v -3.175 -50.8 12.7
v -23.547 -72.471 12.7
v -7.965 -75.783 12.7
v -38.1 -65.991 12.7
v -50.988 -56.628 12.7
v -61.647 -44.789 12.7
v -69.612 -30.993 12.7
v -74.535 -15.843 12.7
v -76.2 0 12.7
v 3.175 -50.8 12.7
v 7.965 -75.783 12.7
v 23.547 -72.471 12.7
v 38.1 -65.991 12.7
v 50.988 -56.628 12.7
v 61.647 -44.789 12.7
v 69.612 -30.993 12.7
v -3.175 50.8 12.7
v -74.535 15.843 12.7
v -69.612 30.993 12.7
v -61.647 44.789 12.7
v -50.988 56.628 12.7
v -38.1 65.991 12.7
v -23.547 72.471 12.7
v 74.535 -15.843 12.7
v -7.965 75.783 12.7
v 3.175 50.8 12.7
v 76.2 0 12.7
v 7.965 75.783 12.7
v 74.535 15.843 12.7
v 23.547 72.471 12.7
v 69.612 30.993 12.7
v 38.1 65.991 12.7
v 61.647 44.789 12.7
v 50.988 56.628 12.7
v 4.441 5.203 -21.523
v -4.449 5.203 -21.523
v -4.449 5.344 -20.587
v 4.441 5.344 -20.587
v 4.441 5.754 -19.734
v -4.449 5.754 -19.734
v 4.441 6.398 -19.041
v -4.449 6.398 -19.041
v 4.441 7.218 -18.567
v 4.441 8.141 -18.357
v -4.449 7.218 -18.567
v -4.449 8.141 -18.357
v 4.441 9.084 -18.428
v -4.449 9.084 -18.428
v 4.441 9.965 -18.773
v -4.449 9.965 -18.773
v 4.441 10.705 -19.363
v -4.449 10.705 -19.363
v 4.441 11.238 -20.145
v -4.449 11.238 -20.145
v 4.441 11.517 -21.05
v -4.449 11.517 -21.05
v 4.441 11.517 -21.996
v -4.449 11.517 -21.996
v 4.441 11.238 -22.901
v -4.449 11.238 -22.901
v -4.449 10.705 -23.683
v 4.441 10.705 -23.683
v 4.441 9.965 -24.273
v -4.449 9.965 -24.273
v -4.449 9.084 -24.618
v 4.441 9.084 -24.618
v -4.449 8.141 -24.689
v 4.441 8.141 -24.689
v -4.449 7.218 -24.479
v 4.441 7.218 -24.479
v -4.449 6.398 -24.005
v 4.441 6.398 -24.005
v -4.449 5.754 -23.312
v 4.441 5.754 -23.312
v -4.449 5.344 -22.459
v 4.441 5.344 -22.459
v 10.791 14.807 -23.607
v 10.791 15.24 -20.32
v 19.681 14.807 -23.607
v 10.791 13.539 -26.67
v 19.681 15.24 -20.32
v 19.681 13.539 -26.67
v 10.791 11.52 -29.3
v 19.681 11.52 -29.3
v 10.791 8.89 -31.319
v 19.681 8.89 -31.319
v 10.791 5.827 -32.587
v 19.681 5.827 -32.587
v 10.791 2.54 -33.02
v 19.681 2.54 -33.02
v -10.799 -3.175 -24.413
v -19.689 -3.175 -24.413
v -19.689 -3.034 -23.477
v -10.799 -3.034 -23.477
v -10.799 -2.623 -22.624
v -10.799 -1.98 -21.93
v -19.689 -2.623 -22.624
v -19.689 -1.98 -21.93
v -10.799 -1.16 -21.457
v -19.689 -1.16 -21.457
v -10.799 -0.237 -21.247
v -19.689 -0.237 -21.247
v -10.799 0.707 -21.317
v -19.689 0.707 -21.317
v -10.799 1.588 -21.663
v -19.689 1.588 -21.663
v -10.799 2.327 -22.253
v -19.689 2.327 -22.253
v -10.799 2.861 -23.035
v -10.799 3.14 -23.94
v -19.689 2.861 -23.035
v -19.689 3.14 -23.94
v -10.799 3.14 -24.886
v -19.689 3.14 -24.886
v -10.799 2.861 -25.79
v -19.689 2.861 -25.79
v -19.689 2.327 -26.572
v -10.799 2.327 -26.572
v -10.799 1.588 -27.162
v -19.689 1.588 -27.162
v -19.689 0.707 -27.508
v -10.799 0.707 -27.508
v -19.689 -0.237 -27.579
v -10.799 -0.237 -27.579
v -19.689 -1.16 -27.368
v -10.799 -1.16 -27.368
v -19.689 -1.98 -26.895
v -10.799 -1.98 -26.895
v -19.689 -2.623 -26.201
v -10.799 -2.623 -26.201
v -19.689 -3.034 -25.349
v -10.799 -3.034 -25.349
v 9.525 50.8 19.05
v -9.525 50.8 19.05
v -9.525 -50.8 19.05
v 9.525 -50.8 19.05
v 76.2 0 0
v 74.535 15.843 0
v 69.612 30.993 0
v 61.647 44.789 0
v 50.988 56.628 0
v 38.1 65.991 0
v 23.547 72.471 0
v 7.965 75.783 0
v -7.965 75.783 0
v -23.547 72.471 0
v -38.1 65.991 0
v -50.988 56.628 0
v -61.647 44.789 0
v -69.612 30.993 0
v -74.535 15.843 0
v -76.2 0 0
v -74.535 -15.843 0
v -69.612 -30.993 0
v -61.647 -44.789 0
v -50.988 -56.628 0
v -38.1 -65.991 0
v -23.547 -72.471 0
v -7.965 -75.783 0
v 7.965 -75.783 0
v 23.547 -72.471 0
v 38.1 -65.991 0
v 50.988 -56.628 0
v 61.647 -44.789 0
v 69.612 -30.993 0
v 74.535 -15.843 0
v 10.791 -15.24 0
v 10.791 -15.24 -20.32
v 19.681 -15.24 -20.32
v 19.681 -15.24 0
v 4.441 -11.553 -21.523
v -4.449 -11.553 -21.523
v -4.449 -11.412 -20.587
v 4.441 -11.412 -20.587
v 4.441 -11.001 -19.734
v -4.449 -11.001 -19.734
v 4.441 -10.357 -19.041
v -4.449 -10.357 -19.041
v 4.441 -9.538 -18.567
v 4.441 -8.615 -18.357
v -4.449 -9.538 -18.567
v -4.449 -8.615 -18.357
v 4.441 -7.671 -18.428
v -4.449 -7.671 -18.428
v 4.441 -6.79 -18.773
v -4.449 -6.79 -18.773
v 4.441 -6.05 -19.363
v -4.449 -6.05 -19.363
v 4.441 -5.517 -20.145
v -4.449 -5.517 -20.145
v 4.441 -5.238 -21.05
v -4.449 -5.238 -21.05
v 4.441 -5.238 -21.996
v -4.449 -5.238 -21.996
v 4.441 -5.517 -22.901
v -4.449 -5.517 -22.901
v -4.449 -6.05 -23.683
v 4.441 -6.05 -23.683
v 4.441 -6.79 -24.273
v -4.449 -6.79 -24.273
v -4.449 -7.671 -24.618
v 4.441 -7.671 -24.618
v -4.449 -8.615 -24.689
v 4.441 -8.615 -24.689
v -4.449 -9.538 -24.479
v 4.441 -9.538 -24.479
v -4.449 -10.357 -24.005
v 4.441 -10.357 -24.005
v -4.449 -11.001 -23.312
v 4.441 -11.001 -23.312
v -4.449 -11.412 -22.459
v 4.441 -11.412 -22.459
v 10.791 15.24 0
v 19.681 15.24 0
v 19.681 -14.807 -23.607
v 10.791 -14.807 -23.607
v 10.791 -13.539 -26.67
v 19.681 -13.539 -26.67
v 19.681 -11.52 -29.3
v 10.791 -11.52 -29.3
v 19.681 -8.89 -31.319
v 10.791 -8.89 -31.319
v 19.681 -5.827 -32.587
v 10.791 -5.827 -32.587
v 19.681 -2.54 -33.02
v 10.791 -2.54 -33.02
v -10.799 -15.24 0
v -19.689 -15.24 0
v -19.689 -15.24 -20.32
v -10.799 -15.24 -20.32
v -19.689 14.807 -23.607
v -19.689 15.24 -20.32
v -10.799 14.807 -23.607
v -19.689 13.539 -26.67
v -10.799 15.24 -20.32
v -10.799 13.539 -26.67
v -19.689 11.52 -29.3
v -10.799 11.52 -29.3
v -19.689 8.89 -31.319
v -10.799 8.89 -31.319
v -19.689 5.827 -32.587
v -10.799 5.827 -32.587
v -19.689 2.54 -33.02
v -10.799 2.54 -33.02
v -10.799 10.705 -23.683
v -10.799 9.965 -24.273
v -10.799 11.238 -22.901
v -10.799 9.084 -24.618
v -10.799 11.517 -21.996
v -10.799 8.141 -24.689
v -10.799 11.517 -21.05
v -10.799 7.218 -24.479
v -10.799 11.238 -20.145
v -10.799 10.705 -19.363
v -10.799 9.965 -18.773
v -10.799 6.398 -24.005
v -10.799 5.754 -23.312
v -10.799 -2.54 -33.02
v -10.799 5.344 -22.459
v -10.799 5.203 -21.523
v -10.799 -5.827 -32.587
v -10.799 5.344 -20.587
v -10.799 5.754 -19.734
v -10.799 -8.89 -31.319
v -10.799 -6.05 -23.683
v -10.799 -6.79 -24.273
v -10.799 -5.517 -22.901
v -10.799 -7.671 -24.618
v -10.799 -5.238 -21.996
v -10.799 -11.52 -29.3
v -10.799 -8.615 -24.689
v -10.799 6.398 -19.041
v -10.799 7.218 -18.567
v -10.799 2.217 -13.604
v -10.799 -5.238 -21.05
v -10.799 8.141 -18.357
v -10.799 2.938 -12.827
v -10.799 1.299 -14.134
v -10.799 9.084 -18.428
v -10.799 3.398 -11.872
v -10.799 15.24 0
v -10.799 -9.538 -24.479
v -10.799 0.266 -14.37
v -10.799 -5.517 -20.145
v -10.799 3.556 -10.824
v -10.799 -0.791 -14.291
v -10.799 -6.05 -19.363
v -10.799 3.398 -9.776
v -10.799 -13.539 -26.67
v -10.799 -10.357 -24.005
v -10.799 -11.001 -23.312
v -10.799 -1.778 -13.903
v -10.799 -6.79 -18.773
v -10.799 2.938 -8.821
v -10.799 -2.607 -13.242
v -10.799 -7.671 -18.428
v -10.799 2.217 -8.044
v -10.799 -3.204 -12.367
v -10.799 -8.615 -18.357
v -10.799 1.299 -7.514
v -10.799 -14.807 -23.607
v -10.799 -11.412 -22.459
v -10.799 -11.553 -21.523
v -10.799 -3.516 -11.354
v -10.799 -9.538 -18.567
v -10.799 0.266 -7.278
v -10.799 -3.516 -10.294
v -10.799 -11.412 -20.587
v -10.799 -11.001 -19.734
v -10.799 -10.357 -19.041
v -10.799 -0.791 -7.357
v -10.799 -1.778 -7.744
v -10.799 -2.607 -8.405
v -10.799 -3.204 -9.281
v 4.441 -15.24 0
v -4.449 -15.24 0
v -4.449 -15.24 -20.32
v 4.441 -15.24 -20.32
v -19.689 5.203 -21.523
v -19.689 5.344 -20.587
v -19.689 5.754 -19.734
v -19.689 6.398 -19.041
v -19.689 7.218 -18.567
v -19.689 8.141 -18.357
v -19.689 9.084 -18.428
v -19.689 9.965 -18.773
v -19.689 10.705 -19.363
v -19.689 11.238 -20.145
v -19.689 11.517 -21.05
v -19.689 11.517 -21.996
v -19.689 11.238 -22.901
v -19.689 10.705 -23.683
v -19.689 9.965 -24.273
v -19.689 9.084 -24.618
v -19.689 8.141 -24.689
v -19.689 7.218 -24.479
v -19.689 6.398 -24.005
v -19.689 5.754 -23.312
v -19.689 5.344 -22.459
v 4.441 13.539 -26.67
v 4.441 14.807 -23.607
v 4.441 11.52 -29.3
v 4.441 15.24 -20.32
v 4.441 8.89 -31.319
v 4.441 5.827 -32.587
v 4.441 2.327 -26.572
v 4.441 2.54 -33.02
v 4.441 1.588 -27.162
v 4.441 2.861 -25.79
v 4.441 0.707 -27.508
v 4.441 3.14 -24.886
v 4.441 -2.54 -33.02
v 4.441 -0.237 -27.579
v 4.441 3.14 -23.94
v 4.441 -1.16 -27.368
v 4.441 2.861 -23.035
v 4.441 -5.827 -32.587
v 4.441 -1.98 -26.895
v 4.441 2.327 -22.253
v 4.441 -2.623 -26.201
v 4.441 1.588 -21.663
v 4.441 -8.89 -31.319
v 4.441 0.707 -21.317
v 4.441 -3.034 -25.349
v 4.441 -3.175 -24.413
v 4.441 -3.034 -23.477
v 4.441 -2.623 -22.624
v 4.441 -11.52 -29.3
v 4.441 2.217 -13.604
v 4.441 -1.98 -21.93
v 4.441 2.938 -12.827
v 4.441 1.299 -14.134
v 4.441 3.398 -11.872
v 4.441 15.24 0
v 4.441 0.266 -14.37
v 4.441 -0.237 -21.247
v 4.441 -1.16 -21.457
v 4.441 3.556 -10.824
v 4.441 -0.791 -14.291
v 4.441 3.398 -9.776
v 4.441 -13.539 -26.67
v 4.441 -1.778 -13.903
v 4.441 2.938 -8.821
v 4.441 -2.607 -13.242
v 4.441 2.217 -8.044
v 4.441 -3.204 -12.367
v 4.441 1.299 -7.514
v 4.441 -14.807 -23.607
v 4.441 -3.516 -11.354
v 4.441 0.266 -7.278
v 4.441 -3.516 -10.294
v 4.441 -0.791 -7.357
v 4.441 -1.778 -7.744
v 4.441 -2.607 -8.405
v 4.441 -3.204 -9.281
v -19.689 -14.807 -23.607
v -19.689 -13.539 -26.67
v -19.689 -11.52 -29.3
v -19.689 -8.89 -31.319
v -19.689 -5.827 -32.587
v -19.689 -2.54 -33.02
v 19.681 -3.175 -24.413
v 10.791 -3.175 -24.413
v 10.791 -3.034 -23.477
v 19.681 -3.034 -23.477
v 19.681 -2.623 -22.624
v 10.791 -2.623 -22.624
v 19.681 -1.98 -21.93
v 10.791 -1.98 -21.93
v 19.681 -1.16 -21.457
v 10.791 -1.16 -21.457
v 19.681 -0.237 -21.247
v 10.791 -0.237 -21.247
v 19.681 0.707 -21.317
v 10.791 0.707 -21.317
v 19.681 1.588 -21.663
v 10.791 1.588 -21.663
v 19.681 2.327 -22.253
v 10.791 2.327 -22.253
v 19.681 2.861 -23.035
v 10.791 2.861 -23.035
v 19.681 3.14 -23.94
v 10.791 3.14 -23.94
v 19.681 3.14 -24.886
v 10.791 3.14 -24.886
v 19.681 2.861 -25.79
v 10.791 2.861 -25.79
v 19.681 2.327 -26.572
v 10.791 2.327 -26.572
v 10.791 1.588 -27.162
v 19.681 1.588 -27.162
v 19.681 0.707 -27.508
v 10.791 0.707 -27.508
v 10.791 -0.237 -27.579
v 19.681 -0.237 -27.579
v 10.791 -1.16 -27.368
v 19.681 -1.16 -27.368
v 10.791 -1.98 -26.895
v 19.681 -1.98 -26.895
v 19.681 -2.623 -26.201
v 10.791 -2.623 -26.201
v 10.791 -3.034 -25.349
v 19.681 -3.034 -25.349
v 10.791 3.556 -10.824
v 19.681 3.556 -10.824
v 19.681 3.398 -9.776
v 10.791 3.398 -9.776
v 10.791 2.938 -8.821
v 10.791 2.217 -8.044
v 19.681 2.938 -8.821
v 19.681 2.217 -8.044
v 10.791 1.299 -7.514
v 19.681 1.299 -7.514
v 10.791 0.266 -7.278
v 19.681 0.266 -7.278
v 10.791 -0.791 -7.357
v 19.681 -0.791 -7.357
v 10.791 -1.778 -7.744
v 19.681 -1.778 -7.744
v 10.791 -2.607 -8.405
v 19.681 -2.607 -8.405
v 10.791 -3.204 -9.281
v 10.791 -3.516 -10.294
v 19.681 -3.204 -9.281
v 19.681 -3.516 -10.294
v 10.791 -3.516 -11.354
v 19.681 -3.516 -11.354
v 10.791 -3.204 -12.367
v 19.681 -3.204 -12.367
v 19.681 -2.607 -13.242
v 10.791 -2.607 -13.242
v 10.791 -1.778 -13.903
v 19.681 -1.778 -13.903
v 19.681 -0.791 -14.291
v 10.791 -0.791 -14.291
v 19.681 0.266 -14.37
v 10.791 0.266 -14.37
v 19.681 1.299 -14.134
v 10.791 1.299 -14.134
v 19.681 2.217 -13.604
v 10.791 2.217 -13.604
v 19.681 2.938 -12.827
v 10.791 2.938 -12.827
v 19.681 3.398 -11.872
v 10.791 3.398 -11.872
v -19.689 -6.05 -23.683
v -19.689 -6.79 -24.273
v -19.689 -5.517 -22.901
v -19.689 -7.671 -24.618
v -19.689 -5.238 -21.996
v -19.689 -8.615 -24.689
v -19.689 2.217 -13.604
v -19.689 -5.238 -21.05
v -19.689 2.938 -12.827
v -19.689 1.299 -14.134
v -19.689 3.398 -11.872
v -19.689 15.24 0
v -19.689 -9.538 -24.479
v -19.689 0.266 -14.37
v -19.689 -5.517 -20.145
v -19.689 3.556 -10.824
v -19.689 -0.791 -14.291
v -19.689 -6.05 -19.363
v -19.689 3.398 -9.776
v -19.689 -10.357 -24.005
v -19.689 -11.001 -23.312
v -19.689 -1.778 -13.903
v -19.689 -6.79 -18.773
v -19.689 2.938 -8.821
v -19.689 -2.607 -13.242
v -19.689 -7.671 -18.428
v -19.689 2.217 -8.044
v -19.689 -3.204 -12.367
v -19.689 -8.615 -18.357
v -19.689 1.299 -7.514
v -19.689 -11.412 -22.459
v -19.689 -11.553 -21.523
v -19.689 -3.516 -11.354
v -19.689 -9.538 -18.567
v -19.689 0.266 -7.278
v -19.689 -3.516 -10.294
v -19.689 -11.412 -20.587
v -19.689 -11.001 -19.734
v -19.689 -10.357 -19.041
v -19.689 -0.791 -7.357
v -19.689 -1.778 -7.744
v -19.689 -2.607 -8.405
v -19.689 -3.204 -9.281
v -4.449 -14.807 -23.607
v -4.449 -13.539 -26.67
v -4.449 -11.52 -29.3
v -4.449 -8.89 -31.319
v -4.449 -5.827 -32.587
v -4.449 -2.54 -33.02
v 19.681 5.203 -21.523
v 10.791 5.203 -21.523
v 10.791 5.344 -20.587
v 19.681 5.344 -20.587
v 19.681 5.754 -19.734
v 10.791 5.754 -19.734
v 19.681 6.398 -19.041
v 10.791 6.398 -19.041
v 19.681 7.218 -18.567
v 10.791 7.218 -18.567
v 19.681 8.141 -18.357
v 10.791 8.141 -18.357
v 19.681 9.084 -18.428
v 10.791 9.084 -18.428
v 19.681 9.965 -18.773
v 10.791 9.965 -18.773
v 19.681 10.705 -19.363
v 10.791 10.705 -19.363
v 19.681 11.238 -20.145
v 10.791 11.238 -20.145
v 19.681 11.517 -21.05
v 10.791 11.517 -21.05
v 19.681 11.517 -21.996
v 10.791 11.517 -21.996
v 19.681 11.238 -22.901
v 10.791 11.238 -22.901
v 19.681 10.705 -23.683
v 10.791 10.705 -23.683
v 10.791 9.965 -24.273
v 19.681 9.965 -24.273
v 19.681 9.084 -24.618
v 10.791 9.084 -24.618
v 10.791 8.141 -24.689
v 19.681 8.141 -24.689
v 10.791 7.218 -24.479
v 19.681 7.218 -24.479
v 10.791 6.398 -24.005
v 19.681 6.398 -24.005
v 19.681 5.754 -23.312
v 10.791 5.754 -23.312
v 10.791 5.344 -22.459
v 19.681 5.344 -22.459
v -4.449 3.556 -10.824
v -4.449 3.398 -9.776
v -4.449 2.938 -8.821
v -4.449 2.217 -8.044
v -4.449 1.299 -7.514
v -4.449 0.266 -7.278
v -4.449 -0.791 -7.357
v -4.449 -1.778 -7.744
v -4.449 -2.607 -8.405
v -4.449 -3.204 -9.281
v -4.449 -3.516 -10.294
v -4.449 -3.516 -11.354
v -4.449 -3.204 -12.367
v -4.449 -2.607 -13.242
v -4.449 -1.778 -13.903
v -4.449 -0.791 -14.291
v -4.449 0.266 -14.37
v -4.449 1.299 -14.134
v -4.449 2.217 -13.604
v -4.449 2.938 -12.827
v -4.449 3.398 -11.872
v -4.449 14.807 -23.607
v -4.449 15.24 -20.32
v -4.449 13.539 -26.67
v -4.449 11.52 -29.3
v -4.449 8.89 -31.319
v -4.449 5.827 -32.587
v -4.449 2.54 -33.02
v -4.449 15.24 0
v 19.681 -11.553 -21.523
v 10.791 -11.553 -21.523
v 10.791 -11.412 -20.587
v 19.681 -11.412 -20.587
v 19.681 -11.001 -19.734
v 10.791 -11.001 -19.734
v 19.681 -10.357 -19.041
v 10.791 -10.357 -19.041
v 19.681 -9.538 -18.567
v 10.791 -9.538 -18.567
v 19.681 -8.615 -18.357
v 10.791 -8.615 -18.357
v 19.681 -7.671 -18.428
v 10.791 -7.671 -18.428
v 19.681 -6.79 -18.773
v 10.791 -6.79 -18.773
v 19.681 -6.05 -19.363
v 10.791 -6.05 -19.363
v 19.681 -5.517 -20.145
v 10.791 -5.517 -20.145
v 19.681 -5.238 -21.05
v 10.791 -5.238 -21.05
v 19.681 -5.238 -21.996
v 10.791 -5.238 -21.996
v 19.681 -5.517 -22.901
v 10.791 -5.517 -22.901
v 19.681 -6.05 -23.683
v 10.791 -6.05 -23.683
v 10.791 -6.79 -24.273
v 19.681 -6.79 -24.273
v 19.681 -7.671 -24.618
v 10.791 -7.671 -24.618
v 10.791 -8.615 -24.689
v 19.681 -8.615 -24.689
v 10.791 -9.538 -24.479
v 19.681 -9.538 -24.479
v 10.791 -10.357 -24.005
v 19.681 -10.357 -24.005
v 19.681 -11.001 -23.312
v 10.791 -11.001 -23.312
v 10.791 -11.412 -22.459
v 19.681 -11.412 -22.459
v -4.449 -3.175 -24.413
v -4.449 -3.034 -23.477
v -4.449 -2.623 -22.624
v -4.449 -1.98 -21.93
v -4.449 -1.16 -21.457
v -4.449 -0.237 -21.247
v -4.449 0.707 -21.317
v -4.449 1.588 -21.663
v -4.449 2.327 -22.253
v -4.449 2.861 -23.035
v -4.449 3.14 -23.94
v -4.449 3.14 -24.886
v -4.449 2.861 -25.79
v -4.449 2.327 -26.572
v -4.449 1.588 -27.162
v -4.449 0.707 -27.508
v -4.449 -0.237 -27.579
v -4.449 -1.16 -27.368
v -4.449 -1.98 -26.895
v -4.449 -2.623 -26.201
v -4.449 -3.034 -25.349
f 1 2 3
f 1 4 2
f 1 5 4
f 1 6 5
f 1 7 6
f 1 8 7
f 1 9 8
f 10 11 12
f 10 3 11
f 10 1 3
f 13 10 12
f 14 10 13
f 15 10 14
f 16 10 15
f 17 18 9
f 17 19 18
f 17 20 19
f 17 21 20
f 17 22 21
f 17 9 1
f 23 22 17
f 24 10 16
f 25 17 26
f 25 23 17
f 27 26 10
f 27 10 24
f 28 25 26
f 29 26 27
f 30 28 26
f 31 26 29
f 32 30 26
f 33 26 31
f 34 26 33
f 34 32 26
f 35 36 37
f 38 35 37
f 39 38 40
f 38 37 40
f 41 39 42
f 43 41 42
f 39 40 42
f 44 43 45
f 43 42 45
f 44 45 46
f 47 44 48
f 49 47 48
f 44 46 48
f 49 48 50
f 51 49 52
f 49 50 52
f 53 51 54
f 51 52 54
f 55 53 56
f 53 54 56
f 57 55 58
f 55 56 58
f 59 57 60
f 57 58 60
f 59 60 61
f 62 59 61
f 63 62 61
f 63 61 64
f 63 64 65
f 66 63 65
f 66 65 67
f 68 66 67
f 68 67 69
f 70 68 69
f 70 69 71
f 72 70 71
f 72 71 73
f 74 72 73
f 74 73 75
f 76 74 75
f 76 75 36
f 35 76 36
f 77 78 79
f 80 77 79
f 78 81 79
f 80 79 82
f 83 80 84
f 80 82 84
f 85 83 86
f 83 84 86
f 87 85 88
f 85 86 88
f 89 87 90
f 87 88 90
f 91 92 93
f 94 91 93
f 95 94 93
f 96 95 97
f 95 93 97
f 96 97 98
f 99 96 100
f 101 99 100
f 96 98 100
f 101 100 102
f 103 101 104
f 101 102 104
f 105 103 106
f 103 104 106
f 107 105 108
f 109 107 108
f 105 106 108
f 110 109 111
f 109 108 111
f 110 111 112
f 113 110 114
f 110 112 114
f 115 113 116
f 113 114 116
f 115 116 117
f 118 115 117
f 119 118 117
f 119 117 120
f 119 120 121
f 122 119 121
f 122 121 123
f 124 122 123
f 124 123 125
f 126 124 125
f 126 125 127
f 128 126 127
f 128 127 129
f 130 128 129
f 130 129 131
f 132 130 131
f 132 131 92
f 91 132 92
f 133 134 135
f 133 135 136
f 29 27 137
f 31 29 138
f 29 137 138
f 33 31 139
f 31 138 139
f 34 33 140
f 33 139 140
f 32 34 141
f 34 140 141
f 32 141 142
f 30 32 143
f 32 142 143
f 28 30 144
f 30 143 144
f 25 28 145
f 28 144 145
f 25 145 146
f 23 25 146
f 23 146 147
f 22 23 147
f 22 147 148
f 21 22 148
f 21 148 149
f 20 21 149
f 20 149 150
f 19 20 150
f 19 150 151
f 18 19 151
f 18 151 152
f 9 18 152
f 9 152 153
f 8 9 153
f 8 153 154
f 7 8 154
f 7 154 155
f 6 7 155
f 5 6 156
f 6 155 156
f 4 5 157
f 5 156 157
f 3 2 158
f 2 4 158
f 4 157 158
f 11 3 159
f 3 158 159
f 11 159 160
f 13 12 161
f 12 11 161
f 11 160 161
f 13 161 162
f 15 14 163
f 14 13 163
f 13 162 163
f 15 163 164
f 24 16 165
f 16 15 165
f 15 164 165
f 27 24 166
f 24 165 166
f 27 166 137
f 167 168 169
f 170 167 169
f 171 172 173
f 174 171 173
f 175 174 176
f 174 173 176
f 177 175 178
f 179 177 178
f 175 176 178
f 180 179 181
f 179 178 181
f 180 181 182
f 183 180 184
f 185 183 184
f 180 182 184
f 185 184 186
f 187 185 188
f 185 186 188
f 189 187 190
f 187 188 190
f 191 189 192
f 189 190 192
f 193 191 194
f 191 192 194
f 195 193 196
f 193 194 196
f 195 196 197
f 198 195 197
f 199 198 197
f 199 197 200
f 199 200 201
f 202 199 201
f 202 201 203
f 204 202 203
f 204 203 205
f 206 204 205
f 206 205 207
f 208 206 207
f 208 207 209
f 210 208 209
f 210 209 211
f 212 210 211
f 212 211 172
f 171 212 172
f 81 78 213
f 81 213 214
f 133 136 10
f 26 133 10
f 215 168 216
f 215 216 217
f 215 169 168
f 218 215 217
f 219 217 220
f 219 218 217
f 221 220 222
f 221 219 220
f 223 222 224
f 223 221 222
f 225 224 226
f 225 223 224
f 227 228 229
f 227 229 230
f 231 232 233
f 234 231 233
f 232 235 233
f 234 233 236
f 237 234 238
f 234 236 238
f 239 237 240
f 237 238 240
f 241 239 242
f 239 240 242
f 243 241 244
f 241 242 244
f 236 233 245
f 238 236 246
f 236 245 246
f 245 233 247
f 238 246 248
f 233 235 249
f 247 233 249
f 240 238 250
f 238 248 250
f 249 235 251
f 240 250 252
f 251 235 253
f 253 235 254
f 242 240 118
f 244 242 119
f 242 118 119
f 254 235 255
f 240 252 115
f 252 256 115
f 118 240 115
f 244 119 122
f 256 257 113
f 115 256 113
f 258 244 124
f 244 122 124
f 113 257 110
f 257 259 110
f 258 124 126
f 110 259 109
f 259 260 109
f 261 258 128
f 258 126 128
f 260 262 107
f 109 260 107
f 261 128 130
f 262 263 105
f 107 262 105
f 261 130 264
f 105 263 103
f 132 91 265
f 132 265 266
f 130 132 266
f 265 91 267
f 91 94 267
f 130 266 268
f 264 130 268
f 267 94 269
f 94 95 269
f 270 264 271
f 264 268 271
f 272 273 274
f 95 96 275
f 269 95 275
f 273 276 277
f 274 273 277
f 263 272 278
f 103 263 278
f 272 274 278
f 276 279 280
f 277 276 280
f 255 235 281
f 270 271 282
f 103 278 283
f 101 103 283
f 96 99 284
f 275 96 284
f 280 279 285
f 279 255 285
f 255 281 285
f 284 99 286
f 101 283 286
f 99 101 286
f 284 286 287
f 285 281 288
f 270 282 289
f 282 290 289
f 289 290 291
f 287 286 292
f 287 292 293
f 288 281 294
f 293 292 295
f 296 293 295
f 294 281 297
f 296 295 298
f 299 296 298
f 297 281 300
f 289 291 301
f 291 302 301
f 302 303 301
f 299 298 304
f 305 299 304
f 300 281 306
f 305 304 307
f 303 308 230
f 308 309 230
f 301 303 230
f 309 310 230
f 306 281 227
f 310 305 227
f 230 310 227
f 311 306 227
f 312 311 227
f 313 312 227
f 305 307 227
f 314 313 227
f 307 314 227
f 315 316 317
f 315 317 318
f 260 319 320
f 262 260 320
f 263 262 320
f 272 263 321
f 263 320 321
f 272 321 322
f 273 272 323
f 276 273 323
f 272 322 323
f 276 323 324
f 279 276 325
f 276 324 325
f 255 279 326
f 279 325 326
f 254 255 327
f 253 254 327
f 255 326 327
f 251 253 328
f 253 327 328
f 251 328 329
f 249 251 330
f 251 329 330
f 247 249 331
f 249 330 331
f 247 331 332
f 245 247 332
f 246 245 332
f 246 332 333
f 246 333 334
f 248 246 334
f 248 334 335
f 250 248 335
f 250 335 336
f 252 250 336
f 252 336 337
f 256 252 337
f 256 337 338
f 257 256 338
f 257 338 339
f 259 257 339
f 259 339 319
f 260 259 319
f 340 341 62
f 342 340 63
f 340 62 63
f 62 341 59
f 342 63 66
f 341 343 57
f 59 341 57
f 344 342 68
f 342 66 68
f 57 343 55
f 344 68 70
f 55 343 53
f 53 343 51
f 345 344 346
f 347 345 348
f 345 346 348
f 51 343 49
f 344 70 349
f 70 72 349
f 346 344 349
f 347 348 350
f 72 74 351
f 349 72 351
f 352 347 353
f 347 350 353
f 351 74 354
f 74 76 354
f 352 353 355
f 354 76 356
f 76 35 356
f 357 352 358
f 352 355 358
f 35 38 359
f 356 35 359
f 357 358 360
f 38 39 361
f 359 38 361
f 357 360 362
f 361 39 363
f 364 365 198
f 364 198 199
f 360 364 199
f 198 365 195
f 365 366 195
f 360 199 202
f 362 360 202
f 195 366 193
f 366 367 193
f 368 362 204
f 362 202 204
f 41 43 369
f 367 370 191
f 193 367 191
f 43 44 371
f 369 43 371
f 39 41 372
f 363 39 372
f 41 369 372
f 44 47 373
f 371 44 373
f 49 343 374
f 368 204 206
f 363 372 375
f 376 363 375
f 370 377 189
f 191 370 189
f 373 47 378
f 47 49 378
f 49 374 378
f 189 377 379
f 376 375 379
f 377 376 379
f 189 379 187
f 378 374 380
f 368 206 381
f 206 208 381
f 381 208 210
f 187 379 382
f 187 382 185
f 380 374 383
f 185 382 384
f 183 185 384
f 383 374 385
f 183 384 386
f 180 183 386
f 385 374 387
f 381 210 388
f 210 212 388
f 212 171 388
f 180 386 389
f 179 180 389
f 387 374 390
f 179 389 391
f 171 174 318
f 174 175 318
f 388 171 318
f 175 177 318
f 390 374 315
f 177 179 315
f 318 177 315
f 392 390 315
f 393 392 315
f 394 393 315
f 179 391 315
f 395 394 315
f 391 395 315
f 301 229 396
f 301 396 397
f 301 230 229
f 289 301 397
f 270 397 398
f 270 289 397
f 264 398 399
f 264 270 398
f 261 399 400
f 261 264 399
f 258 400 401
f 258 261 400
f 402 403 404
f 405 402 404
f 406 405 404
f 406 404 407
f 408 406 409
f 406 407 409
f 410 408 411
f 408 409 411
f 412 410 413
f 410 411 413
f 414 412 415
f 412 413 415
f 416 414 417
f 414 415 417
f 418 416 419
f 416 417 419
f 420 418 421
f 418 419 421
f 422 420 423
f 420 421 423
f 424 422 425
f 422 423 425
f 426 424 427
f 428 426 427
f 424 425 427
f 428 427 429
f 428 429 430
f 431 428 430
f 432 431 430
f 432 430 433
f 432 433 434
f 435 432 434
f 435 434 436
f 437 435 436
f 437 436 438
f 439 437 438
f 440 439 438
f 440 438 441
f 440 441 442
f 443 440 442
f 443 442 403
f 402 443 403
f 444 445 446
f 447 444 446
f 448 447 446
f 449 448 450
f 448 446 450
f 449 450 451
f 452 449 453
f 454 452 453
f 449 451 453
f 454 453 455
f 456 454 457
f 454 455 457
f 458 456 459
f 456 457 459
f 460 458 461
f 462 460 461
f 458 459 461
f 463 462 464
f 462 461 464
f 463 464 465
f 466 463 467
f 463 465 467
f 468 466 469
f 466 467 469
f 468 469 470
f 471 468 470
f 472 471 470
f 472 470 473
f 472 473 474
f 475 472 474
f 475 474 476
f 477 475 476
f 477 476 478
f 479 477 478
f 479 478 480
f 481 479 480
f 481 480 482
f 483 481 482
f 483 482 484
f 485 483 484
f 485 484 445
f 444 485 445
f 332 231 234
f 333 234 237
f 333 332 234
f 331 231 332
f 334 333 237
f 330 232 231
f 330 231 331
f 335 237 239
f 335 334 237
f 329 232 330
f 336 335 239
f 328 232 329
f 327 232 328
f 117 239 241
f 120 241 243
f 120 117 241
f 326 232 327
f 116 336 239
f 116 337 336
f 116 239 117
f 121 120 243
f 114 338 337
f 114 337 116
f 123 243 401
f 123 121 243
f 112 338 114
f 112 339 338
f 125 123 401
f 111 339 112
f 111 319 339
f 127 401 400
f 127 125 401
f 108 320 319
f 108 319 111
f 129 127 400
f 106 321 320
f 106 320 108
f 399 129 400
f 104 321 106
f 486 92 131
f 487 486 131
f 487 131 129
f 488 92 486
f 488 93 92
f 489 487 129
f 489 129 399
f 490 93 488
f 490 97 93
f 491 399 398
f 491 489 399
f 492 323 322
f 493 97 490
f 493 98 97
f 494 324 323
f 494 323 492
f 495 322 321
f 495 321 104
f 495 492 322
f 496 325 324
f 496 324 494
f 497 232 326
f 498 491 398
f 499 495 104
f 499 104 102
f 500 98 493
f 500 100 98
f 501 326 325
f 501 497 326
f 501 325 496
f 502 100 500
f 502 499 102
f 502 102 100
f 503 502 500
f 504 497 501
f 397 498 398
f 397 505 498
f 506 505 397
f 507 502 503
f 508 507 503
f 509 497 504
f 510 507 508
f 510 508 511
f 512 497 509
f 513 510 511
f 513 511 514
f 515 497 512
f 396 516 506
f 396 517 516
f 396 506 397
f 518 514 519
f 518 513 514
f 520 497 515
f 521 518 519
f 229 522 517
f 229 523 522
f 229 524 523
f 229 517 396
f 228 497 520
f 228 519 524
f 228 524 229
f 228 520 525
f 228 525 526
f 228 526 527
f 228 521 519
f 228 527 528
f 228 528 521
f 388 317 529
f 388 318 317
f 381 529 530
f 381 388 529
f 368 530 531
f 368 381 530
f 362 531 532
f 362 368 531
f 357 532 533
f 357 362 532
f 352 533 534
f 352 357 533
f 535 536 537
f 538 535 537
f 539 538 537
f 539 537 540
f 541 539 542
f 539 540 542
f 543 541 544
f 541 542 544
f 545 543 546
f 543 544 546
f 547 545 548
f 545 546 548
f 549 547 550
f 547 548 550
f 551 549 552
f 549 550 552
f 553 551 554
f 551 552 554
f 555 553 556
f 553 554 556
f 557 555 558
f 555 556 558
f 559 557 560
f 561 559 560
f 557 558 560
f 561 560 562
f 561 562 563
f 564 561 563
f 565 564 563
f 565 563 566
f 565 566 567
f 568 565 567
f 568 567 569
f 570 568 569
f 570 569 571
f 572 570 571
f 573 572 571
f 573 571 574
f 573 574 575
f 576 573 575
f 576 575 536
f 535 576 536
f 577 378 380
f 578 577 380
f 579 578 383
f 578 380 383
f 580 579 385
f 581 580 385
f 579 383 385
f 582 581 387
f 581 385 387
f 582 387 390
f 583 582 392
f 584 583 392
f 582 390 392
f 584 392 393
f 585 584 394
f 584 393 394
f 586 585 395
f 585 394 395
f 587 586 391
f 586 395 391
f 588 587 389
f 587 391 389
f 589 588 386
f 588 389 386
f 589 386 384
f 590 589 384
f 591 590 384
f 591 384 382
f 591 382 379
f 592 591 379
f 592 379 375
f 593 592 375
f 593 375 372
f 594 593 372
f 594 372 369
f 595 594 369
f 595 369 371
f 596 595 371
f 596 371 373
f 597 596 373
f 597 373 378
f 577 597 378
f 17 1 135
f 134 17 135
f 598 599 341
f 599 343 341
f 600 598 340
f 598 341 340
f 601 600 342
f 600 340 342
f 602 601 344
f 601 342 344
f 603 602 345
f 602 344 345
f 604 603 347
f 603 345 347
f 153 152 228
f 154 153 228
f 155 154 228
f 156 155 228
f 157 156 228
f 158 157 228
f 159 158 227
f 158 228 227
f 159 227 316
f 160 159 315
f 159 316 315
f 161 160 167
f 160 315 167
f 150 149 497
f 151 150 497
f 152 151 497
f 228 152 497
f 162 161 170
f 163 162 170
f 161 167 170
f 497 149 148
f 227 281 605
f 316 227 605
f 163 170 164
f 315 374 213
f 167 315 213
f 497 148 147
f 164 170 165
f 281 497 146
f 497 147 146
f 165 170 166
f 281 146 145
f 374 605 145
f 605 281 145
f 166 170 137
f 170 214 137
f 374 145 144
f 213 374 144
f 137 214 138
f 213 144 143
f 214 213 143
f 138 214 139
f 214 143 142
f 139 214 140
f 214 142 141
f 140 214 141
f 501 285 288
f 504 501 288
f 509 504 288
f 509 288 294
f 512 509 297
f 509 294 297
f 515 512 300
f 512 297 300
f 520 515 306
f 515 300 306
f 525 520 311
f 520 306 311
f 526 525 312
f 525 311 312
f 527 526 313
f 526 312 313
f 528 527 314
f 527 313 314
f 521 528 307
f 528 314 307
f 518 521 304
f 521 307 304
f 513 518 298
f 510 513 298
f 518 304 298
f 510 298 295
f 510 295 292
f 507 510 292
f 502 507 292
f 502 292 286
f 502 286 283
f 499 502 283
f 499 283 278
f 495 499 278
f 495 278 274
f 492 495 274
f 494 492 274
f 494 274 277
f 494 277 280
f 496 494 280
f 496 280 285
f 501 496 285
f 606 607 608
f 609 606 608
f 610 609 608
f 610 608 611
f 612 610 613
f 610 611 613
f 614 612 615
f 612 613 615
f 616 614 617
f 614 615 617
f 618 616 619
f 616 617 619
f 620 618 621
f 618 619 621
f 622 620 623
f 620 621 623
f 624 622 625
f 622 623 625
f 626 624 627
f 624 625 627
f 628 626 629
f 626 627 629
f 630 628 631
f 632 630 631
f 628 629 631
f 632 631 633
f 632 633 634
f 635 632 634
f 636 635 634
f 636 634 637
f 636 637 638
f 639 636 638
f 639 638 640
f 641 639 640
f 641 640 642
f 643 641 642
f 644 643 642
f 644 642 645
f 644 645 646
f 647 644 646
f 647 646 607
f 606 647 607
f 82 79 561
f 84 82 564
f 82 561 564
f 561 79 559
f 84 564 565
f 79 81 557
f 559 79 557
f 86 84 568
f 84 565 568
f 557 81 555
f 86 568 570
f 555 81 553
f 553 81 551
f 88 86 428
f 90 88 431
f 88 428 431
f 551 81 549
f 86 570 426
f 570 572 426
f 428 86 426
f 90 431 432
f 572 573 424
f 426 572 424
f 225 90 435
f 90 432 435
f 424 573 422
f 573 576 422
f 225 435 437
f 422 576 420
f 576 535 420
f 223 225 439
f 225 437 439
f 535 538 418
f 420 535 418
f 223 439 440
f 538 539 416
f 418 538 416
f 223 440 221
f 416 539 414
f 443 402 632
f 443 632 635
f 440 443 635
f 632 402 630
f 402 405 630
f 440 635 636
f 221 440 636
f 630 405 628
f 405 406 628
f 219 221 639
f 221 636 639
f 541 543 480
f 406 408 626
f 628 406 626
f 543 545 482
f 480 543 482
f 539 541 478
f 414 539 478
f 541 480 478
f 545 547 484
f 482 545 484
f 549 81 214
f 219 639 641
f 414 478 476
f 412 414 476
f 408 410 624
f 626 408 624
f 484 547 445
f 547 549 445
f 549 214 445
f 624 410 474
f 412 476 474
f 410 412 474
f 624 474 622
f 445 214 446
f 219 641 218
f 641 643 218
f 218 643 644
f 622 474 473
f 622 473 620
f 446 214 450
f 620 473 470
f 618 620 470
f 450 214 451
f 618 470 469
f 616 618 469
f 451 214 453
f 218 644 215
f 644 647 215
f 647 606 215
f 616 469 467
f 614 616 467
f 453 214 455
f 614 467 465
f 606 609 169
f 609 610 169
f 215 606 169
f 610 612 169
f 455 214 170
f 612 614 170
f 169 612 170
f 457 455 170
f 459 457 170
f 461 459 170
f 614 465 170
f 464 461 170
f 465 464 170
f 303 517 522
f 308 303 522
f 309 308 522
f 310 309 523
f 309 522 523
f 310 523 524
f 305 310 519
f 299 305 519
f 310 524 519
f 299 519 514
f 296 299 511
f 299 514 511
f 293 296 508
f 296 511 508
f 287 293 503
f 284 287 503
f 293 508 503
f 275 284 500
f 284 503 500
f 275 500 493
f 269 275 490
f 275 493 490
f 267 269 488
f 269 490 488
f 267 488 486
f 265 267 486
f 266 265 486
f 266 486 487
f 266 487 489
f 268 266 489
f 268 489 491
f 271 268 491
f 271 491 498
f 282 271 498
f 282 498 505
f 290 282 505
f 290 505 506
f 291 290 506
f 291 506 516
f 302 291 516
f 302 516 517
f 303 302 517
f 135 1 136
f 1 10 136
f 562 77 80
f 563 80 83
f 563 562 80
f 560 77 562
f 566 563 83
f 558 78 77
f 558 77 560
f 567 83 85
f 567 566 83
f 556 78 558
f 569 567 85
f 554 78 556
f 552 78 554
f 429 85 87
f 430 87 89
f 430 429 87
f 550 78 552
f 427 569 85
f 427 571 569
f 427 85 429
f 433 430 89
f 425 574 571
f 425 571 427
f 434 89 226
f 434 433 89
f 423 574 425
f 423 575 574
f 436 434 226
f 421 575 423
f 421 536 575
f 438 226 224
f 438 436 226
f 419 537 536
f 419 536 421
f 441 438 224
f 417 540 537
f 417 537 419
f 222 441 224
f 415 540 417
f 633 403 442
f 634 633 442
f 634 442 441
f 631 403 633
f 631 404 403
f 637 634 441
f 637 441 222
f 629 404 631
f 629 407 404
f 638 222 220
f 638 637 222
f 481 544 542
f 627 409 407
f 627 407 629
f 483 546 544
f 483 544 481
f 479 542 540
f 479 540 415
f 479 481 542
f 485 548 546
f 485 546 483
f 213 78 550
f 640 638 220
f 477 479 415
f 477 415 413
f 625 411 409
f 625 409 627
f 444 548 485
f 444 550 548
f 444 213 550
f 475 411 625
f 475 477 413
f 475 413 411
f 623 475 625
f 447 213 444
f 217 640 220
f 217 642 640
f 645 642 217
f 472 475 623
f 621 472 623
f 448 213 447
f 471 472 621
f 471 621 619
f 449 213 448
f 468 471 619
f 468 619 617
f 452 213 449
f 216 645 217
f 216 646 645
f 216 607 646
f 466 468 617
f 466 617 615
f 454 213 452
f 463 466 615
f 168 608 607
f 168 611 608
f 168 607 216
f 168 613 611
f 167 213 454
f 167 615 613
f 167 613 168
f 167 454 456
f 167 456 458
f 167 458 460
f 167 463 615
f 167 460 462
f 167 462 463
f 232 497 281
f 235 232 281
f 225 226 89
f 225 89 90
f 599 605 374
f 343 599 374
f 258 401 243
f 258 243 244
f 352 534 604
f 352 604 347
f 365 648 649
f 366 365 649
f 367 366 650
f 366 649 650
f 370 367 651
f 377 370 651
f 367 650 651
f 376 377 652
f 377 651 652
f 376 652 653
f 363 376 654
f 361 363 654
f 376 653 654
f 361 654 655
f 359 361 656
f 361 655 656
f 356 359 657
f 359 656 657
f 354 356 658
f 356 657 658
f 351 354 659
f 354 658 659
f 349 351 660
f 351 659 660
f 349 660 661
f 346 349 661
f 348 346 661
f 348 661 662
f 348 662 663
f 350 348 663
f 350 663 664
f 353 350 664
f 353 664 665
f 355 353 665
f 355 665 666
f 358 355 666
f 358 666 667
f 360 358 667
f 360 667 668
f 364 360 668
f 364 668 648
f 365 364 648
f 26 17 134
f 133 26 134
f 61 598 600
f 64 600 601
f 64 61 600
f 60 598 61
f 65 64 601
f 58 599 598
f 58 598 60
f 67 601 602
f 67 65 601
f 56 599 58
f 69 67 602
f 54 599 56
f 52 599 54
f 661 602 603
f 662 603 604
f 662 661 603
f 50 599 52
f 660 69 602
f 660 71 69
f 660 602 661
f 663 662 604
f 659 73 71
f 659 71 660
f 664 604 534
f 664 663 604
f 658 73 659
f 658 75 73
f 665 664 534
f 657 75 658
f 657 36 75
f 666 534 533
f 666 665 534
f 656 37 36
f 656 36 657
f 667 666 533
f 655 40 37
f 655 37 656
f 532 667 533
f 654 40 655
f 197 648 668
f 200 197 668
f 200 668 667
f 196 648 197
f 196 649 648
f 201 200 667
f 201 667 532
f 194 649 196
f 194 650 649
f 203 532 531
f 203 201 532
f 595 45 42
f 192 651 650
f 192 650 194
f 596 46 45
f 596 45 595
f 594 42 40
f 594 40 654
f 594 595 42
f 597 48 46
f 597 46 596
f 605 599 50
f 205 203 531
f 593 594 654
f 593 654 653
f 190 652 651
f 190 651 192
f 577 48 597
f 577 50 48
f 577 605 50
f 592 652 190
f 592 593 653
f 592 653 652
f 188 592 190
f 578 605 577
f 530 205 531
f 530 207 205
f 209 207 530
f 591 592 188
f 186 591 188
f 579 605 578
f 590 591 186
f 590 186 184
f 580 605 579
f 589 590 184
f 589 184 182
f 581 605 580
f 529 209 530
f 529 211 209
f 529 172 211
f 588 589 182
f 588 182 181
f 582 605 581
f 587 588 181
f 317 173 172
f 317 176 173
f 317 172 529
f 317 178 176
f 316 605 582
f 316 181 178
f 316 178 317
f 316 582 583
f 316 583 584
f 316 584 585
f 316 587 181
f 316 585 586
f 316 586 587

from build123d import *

# Parameters (mm, degrees)
F0_R      = 76.2
F1_DEPTH  = 12.7
F2_W      = 19.05
F2_H      = 101.6
F3_DEPTH  = 6.35
F5_DEPTH  = 127.001
F6_W      = 8.89
F6_H      = 30.48
F7_DEPTH  = 33.02
F8_R      = 12.7
F9_R      = 3.556
F10_DEPTH = 95.882075
F11_R     = 3.175
F12_DEPTH = 95.889925


with BuildPart() as f1:
    # F0 (on Top) → F1 (new body)
    with BuildSketch(Plane.XY):
        Circle(F0_R)
    extrude(amount=F1_DEPTH)

    # F2 (on face) → F3 (join)
    with BuildSketch(Plane.XY.offset(12.7)):
        Rectangle(F2_W, F2_H)
    extrude(amount=F3_DEPTH)

    # F4 (on face) → F5 (cut, through all)
    with BuildSketch(Plane.XZ.offset(50.8)):
        Polygon((-3.175, 12.7), (-9.525, 19.05), (-9.525, 12.7), align=None)
        Polygon((9.525, 12.7), (9.525, 19.05), (3.175, 12.7), align=None)
    extrude(amount=-F5_DEPTH, mode=Mode.SUBTRACT)

    # F6 (on face) → F7 (join)
    with BuildSketch(Plane(origin=(0, 0, 0), x_dir=(1, 0, 0), z_dir=(0, 0, -1))):
        with Locations((15.236075, 0)):
            Rectangle(F6_W, F6_H)
        with Locations((-0.003925, 0)):
            Rectangle(F6_W, F6_H)
        with Locations((-15.243925, 0)):
            Rectangle(F6_W, F6_H)
    extrude(amount=F7_DEPTH)

    # F8
    f8_edges = [f1.edges().sort_by_distance(p)[0] for p in [
        (-15.243925, -15.24, -33.02),
        (-15.243925, 15.24, -33.02),
        (-0.003925, -15.24, -33.02),
        (-0.003925, 15.24, -33.02),
        (15.236075, 15.24, -33.02),
        (15.236075, -15.24, -33.02),
    ]]
    fillet(f8_edges, radius=F8_R)

    # F9 (on face) → F10 (cut, through all)
    with BuildSketch(Plane.YZ.offset(19.681075)):
        with Locations((0, -10.823786)):
            Circle(F9_R)
    extrude(amount=-F10_DEPTH, mode=Mode.SUBTRACT)

    # F11 (on face) → F12 (cut, through all)
    with BuildSketch(Plane(origin=(-19.688925, 0, 0), x_dir=(0, -1, 0), z_dir=(-1, 0, 0))):
        with Locations((-8.377785, -21.523021)):
            Circle(F11_R)
        with Locations((0, -24.412786)):
            Circle(F11_R)
        with Locations((8.377784, -21.523022)):
            Circle(F11_R)
    extrude(amount=-F12_DEPTH, mode=Mode.SUBTRACT)


solid = f1.part
